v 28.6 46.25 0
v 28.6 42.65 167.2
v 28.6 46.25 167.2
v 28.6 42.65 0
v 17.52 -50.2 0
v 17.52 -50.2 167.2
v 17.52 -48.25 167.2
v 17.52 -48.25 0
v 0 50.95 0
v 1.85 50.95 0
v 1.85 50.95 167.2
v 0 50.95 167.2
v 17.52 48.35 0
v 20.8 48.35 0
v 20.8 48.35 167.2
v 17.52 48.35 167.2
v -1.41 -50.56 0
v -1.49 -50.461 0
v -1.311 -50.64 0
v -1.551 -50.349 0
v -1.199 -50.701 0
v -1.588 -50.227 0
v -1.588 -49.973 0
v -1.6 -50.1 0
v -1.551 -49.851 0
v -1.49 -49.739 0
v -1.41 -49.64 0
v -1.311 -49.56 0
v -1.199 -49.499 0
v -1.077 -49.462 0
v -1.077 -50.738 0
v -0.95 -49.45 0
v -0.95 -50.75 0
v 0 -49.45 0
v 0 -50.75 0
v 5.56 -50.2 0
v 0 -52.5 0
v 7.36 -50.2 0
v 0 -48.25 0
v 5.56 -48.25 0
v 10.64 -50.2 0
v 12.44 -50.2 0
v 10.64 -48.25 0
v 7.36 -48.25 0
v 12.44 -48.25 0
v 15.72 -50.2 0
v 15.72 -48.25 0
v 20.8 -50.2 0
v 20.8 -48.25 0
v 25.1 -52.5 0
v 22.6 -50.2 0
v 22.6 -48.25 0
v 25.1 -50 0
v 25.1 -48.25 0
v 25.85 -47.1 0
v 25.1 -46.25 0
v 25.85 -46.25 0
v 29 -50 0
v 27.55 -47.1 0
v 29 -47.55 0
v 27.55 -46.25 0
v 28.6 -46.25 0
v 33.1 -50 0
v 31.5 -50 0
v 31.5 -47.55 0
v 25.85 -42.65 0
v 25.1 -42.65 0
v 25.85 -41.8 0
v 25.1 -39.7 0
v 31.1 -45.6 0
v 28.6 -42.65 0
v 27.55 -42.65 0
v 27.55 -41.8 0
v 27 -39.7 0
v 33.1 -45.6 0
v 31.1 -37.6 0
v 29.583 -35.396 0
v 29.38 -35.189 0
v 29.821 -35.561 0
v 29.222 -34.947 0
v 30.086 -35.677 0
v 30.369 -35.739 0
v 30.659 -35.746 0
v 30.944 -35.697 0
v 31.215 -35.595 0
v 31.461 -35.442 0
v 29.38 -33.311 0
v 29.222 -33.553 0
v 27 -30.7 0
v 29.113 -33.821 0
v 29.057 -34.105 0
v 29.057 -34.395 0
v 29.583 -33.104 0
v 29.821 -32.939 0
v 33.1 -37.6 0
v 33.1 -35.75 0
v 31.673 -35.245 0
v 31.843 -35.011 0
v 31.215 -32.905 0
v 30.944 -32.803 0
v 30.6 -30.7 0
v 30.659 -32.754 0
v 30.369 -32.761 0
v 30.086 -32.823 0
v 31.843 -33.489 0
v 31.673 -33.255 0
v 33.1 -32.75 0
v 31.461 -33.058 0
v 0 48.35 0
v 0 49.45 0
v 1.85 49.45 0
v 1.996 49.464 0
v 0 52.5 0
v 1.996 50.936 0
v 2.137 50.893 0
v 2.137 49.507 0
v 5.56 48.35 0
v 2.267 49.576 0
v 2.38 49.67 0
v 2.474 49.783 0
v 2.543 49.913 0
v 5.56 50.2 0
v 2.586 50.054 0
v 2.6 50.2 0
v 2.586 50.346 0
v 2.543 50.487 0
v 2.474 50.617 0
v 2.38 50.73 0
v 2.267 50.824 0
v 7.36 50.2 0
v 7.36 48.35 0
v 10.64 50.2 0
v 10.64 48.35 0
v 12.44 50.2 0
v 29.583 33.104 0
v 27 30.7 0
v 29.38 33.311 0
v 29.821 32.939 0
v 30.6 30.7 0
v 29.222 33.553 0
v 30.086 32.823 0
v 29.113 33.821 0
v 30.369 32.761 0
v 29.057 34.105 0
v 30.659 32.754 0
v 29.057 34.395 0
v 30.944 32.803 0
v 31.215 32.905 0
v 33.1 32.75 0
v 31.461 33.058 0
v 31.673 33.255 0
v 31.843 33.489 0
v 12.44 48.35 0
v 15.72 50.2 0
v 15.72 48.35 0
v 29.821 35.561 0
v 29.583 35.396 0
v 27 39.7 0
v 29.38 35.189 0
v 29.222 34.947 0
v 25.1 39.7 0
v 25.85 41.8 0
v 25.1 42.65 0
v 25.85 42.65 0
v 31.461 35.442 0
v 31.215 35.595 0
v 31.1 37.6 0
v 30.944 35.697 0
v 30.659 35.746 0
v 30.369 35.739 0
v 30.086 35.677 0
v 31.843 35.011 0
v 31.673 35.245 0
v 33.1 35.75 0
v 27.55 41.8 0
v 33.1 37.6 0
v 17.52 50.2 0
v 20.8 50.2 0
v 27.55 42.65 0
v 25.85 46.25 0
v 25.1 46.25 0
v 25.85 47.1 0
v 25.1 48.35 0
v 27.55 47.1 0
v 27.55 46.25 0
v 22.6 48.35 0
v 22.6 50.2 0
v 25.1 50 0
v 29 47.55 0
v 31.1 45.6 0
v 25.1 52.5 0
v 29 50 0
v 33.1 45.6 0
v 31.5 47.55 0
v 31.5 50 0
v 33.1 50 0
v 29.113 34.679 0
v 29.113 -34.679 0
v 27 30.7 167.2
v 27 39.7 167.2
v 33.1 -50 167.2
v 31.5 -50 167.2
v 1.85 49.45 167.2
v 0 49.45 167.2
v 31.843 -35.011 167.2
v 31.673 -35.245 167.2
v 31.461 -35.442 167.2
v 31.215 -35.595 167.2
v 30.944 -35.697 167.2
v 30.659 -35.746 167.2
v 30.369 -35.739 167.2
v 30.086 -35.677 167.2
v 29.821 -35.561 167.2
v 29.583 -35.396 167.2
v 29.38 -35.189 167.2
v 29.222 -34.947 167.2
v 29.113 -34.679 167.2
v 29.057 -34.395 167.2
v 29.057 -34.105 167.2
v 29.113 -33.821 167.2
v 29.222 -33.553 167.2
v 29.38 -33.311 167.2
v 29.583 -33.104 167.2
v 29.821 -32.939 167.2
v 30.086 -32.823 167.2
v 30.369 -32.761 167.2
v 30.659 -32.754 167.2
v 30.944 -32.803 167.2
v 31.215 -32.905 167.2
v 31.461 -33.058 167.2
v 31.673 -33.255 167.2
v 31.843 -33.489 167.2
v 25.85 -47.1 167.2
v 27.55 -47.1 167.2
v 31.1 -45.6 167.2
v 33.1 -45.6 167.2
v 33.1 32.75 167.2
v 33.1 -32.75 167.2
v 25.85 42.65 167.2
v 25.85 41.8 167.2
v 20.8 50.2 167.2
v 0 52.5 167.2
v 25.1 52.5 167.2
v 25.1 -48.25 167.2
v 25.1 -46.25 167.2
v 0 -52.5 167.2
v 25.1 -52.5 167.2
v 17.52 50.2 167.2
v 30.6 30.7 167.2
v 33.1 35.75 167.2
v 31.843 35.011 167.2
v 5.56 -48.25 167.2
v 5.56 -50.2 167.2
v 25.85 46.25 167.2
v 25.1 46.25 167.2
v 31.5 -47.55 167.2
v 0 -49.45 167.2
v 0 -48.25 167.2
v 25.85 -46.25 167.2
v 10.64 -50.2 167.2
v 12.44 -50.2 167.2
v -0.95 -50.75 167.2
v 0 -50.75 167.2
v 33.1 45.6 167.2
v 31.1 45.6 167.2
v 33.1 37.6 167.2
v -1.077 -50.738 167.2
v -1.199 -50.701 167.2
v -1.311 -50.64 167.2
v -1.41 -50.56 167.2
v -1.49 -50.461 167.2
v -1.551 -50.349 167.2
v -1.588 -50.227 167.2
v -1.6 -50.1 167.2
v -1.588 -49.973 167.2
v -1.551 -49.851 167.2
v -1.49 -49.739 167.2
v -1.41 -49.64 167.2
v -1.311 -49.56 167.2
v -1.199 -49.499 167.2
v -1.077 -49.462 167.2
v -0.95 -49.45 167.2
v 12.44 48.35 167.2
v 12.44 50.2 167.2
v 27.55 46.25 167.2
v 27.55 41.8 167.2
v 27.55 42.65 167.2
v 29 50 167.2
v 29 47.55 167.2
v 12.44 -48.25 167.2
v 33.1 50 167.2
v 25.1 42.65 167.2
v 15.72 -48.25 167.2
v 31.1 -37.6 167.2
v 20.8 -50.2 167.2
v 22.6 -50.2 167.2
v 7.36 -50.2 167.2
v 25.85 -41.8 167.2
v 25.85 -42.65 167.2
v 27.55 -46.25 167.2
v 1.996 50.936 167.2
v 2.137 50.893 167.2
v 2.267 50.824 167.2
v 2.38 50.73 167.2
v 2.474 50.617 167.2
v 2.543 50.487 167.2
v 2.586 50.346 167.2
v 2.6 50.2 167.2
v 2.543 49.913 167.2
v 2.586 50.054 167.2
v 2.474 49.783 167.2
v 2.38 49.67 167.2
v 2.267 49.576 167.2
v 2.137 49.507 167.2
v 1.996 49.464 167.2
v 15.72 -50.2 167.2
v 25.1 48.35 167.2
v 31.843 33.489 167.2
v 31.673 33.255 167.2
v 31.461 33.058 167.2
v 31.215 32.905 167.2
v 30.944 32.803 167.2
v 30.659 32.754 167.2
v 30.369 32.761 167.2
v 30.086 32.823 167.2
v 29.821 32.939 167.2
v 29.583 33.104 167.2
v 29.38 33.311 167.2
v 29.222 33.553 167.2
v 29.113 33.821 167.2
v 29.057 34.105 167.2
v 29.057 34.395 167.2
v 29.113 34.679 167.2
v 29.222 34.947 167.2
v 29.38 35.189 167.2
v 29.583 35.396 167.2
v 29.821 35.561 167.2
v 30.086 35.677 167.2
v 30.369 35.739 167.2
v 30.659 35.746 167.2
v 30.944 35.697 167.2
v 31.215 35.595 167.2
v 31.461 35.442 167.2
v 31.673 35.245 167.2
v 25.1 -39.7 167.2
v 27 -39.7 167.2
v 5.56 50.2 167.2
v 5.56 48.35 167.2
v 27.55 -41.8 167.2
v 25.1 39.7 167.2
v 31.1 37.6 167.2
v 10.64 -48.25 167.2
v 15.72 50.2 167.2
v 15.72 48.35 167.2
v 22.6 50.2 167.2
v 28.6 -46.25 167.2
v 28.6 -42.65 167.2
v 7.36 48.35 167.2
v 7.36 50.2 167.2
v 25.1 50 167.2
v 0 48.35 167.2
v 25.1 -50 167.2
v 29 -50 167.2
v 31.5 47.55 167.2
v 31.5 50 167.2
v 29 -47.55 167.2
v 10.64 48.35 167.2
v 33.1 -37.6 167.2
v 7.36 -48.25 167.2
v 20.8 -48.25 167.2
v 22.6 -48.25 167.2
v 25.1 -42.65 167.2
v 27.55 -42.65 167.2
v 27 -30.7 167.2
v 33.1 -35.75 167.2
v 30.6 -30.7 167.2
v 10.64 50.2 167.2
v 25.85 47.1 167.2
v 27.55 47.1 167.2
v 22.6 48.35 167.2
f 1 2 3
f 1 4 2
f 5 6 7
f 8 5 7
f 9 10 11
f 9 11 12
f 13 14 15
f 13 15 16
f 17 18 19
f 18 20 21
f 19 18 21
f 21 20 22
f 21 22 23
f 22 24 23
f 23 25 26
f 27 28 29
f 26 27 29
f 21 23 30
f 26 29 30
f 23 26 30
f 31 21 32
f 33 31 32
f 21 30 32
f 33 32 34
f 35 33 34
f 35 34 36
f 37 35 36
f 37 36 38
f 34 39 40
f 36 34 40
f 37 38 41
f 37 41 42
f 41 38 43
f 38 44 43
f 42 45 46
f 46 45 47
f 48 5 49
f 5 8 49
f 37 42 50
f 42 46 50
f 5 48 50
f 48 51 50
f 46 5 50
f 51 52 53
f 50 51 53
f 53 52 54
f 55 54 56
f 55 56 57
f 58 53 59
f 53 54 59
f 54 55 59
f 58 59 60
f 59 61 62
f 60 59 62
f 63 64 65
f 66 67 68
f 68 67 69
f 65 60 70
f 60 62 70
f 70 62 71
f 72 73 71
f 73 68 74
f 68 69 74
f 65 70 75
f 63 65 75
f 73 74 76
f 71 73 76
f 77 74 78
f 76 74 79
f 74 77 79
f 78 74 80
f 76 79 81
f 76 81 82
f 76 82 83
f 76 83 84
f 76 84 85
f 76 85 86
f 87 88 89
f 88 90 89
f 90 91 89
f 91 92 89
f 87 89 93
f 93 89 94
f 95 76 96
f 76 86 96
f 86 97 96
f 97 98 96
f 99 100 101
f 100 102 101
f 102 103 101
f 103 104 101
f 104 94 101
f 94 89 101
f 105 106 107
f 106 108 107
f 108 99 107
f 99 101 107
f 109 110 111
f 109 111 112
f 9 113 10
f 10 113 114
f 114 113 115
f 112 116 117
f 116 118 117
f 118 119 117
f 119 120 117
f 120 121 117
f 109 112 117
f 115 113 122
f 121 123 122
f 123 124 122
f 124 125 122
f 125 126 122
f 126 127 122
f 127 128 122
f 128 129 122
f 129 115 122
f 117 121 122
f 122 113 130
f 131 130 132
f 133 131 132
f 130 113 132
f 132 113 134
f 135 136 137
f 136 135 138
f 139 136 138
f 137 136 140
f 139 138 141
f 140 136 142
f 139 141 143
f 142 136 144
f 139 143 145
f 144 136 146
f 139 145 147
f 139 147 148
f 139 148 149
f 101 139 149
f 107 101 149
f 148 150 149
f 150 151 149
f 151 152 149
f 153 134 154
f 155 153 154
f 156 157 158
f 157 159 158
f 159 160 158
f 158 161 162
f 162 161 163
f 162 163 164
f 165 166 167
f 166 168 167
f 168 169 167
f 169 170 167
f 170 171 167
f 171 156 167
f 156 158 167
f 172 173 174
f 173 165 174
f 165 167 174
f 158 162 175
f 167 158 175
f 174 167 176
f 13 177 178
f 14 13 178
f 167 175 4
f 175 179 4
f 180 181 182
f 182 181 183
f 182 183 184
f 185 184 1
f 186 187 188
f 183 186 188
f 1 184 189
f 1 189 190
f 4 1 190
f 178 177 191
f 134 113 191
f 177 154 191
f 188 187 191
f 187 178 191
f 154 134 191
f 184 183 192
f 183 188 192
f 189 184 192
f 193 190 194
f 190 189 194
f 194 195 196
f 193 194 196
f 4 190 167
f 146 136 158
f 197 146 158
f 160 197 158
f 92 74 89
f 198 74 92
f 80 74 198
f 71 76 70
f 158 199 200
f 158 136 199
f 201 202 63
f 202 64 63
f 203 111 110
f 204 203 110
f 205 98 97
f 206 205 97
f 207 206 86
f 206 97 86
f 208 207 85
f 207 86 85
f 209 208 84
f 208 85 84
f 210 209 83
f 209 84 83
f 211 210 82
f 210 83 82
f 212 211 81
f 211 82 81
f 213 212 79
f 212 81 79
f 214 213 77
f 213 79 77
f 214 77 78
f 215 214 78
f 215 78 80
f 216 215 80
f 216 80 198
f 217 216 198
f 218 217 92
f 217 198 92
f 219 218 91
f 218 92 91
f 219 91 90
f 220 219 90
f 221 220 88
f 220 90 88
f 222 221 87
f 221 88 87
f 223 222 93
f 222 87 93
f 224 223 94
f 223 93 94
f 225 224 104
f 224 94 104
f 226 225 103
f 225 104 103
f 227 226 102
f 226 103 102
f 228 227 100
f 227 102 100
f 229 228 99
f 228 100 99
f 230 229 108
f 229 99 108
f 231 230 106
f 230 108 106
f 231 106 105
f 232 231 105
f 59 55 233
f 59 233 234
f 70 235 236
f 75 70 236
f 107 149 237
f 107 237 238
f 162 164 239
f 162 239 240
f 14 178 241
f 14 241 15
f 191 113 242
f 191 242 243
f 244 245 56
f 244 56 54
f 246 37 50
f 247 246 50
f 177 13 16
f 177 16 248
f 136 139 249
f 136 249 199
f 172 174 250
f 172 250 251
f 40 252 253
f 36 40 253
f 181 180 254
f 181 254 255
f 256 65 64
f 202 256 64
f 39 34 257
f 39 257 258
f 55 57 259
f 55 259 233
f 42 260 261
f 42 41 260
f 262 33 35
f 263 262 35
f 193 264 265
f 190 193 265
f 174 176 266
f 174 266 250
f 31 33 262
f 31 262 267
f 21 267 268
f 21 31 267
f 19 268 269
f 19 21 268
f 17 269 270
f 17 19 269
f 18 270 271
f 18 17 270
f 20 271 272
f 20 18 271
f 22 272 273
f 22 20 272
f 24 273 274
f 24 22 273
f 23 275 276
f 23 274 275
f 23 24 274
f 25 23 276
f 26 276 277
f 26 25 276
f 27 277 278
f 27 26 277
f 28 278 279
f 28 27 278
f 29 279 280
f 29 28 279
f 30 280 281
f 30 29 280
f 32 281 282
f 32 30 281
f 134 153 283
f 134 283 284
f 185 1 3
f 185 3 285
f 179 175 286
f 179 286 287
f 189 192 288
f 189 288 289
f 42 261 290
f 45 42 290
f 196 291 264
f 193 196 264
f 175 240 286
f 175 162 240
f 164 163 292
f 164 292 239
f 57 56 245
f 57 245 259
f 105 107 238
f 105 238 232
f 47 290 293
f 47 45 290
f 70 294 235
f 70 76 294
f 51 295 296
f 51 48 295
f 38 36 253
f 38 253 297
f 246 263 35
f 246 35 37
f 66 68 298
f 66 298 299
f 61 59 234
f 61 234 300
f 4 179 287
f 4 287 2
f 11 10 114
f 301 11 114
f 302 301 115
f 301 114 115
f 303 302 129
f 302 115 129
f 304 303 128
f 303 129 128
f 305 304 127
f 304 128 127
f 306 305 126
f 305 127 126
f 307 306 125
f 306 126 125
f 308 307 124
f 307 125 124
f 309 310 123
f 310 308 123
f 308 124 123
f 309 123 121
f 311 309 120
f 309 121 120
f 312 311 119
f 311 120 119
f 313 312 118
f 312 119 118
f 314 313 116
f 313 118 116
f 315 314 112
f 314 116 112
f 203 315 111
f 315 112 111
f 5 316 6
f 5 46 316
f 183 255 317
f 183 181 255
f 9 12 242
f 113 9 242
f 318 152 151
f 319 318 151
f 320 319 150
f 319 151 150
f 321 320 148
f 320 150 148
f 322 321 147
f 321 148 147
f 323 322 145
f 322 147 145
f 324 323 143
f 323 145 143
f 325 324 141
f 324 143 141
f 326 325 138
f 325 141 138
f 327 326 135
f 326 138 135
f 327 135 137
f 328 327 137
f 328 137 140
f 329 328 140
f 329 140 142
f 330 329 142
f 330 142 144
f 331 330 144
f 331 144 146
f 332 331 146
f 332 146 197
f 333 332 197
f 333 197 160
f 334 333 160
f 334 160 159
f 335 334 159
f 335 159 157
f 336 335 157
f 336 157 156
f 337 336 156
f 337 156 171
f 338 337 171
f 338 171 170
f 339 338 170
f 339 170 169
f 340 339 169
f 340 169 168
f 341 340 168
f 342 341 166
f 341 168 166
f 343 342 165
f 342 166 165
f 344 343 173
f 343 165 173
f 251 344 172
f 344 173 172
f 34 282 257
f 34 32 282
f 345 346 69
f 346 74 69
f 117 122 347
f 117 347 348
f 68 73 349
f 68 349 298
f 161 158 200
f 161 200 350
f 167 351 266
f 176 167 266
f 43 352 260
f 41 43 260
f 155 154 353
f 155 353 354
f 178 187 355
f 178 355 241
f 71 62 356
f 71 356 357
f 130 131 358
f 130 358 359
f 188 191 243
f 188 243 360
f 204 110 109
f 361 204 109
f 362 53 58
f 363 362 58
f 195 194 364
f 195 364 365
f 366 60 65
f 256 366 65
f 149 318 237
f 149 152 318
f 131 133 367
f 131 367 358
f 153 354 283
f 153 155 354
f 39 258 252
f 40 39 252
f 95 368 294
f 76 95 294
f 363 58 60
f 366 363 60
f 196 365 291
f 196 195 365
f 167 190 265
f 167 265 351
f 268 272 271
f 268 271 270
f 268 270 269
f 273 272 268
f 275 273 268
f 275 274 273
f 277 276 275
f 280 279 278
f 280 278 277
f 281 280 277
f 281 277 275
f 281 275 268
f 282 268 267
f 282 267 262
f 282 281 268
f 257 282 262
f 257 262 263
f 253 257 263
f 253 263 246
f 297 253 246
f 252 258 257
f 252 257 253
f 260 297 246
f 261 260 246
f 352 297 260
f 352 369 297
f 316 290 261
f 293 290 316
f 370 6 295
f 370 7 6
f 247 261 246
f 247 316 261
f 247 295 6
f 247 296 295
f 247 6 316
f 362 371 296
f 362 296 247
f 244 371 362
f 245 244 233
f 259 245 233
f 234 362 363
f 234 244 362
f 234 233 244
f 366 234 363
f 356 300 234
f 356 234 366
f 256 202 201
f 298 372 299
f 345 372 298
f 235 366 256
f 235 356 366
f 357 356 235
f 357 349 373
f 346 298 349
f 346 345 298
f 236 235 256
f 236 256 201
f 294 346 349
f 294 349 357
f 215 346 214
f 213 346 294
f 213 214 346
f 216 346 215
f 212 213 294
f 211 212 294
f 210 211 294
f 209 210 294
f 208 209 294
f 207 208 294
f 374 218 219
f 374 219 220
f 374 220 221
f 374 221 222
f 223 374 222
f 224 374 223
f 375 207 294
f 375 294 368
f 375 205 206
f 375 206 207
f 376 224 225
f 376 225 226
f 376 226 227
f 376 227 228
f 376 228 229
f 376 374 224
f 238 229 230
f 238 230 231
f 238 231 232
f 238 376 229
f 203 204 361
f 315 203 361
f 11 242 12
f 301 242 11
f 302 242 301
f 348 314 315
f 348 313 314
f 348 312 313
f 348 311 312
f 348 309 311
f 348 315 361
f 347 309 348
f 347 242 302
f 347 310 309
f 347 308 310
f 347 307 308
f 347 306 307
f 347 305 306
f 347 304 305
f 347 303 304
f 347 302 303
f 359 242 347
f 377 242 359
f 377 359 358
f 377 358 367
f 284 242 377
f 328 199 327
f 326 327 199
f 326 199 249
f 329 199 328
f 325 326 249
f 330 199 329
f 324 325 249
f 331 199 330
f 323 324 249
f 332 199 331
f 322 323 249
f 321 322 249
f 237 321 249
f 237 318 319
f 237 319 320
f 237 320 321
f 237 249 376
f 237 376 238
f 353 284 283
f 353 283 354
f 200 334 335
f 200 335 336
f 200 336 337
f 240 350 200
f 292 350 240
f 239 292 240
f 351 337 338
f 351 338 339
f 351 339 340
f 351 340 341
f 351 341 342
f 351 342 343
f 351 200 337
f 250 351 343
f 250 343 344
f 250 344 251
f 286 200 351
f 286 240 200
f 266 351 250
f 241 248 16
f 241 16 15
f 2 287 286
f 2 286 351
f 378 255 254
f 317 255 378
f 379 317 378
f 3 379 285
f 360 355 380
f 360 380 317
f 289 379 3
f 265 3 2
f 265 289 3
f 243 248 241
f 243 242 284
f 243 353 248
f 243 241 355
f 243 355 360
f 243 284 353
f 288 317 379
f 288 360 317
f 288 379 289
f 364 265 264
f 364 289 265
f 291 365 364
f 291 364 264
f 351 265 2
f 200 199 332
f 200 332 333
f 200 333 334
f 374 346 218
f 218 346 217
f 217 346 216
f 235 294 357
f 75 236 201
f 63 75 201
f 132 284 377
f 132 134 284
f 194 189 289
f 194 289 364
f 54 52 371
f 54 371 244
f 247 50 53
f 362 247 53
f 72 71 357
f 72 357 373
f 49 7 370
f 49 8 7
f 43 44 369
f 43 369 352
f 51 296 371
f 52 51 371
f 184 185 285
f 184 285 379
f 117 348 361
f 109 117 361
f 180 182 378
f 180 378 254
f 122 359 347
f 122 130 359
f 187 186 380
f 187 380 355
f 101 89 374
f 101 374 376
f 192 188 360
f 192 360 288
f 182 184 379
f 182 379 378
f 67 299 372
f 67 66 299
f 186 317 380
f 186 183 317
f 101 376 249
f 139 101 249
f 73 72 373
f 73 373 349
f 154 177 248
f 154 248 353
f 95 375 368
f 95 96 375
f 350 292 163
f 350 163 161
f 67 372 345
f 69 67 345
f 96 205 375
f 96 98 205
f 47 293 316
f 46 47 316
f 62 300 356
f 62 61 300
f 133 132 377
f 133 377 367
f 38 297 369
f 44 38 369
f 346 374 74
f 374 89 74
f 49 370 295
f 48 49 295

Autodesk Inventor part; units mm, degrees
ref_plane "YZ Plane" through (0, 0, 0) normal (1, 0, 0) x (0, 1, 0)
ref_plane "XZ Plane" through (0, 0, 0) normal (0, 1, 0) x (-1, 0, 0)
ref_plane "XY Plane" through (0, 0, 0) normal (0, 0, 1) x (1, 0, 0)
sketch "Sketch1" plane through (0, 0, 0) normal (0, 0, 1) x (1, 0, 0)
  line L0 (0, 52.5) -> (25.1, 52.5)
  line L1 (33.1, 32.75) -> (33.1, -32.75)
  line L2 (0, -48.25) -> (5.56, -48.25)
  line L3 (27, -30.7) -> (30.6, -30.7)
  line L4 (30.6, -30.7) -> (30.6, 30.7)
  line L5 (30.6, 30.7) -> (27, 30.7)
  line L6 (25.1, 48.35) -> (22.6, 48.35)
  arc A0 (-0.95, -49.45) -> (-0.95, -50.75) centre (-0.95, -50.1) ccw
  line L7 (-0.95, -49.45) -> (0, -49.45)
  line L8 (0, -49.45) -> (0, -48.25)
  line L9 (-0.95, -50.75) -> (0, -50.75)
  line L10 (0, -50.75) -> (0, -52.5)
  line L11 (0, -52.5) -> (25.1, -52.5)
  line L12 (25.1, -52.5) -> (25.1, -50)
  line L13 (25.1, -50) -> (29, -50)
  line L14 (29, -50) -> (29, -47.55)
  line L15 (29, -47.55) -> (31.5, -47.55)
  line L16 (31.5, -47.55) -> (31.5, -50)
  line L17 (31.5, -50) -> (33.1, -50)
  line L18 (25.1, 52.5) -> (25.1, 50)
  line L19 (25.1, 50) -> (29, 50)
  line L20 (29, 50) -> (29, 47.55)
  line L21 (29, 47.55) -> (31.5, 47.55)
  line L22 (31.5, 47.55) -> (31.5, 50)
  line L23 (31.5, 50) -> (33.1, 50)
  arc A1 (1.85, 49.45) -> (1.85, 50.95) centre (1.85, 50.2) ccw
  line L24 (0, 49.45) -> (0, 48.35)
  line L25 (0, 50.95) -> (0, 52.5)
  line L26 (1.85, 50.95) -> (0, 50.95)
  line L27 (1.85, 49.45) -> (0, 49.45)
  line L28 (27, 30.7) -> (27, 39.7)
  line L29 (27, 39.7) -> (25.1, 39.7)
  line L30 (25.1, 46.25) -> (25.1, 48.35)
  line L31 (27, -30.7) -> (27, -39.7)
  line L32 (27, -39.7) -> (25.1, -39.7)
  line L33 (25.1, -46.25) -> (25.1, -48.25)
  line L34 (-8.54, 0) -> (40.04, 0) projected
  line L35 (33.1, 50) -> (33.1, 45.6)
  line L36 (33.1, 45.6) -> (31.1, 45.6)
  line L37 (31.1, 45.6) -> (31.1, 37.6)
  line L38 (31.1, 37.6) -> (33.1, 37.6)
  line L39 (33.1, -37.6) -> (31.1, -37.6)
  line L40 (31.1, -37.6) -> (31.1, -45.6)
  line L41 (31.1, -45.6) -> (33.1, -45.6)
  line L42 (33.1, -45.6) -> (33.1, -50)
  line L43 (33.1, 37.6) -> (33.1, 35.75)
  line L44 (33.1, 35.75) -> (30.55, 34.25)
  line L45 (30.55, 34.25) -> (33.1, 32.75)
  line L46 (33.1, -32.75) -> (30.55, -34.25)
  line L47 (30.55, -34.25) -> (33.1, -35.75)
  line L48 (33.1, -35.75) -> (33.1, -37.6)
  line L49 (22.6, 48.35) -> (22.6, 50.2)
  line L50 (22.6, 50.2) -> (20.8, 50.2)
  line L51 (20.8, 50.2) -> (20.8, 48.35)
  line L52 (20.8, 48.35) -> (17.52, 48.35)
  line L53 (17.52, 48.35) -> (17.52, 50.2)
  line L54 (17.52, 50.2) -> (15.72, 50.2)
  line L55 (15.72, 50.2) -> (15.72, 48.35)
  line L56 (15.72, 48.35) -> (12.44, 48.35)
  line L57 (12.44, 48.35) -> (12.44, 50.2)
  line L58 (12.44, 50.2) -> (10.64, 50.2)
  line L59 (10.64, 50.2) -> (10.64, 48.35)
  line L60 (10.64, 48.35) -> (7.36, 48.35)
  line L61 (7.36, 48.35) -> (7.36, 50.2)
  line L62 (7.36, 50.2) -> (5.56, 50.2)
  line L63 (5.56, 50.2) -> (5.56, 48.35)
  line L64 (5.56, 48.35) -> (0, 48.35)
  line L65 (5.56, -48.25) -> (5.56, -50.2)
  line L66 (5.56, -50.2) -> (7.36, -50.2)
  line L67 (7.36, -50.2) -> (7.36, -48.25)
  line L68 (7.36, -48.25) -> (10.64, -48.25)
  line L69 (10.64, -48.25) -> (10.64, -50.2)
  line L70 (10.64, -50.2) -> (12.44, -50.2)
  line L71 (12.44, -50.2) -> (12.44, -48.25)
  line L72 (12.44, -48.25) -> (15.72, -48.25)
  line L73 (15.72, -48.25) -> (15.72, -50.2)
  line L74 (15.72, -50.2) -> (17.52, -50.2)
  line L75 (17.52, -50.2) -> (17.52, -48.25)
  line L76 (17.52, -48.25) -> (20.8, -48.25)
  line L77 (20.8, -48.25) -> (20.8, -50.2)
  line L78 (20.8, -50.2) -> (22.6, -50.2)
  line L79 (22.6, -50.2) -> (22.6, -48.25)
  line L80 (22.6, -48.25) -> (25.1, -48.25)
  line L81 (25.1, 42.65) -> (25.1, 39.7)
  line L82 (25.1, 42.65) -> (25.85, 42.65)
  line L83 (25.85, 42.65) -> (25.85, 41.8)
  line L84 (25.85, 41.8) -> (27.55, 41.8)
  line L85 (27.55, 41.8) -> (27.55, 42.65)
  line L86 (27.55, 42.65) -> (28.6, 42.65)
  line L87 (28.6, 42.65) -> (28.6, 46.25)
  line L88 (28.6, 46.25) -> (27.55, 46.25)
  line L89 (27.55, 46.25) -> (27.55, 47.1)
  line L90 (27.55, 47.1) -> (25.85, 47.1)
  line L91 (25.85, 47.1) -> (25.85, 46.25)
  line L92 (25.85, 46.25) -> (25.1, 46.25)
  line L93 (25.1, -46.25) -> (25.85, -46.25)
  line L94 (25.85, -46.25) -> (25.85, -47.1)
  line L95 (25.85, -47.1) -> (27.55, -47.1)
  line L96 (27.55, -47.1) -> (27.55, -46.25)
  line L97 (27.55, -46.25) -> (28.6, -46.25)
  line L98 (28.6, -46.25) -> (28.6, -42.65)
  line L99 (28.6, -42.65) -> (27.55, -42.65)
  line L100 (27.55, -42.65) -> (27.55, -41.8)
  line L101 (27.55, -41.8) -> (25.85, -41.8)
  line L102 (25.85, -41.8) -> (25.85, -42.65)
  line L103 (25.85, -42.65) -> (25.1, -42.65)
  line L104 (25.1, -42.65) -> (25.1, -39.7)
  point P0 (0, 0)
  dimension "d7" = 21.8
  dimension "d10" = 0.65
  dimension "d11" = 34.7
  dimension "d14" = 105
  dimension "d16" = 100
  dimension "d17" = 95.1
  dimension "d18" = 2.5
  dimension "d20" = 1.6
  dimension "d24" = 2.5
  dimension "d29" = 96.6
  dimension "d30" = 1.85
  dimension "d31" = 1.5
  dimension "d32" = 100.3
  dimension "d33" = 8
  dimension "d34" = 33.1
  dimension "d35" = 2.6
  dimension "d36" = 12.8
  dimension "d37" = 6.1
  dimension "d49" = 8
  dimension "d50" = 4.4
  dimension "d51" = 4.1
  dimension "d52" = 3
  dimension "d53" = 2.55
  dimension "d55" = 68.5
  dimension "d56" = 1.8
  dimension "d57" = 5.08
  dimension "d58" = 10.5
  dimension "d59" = 4.15
  dimension "d60" = 3.6
  dimension "d61" = 0.75
  dimension "d62" = 1.7
  dimension "d63" = 3.5
  dimension "d64" = 5.3
  dimension "d65" = 94.2
extrude "Extrusion1" add sketch "Sketch1" along normal blind 167.2
sketch "Sketch2" plane through (0, 0, 167.2) normal (0, 0, 1) x (1, 0, 0)
  line L0 (33.1, -50) -> (33.1, 50) projected
  line L1 (-8.54, 0) -> (40.04, 0) projected
  point P0 (0, 0)
  point P1 (30.55, 34.25)
  point P2 (30.55, -34.25)
  dimension "d40" = 2.55
  dimension "d41" = 68.5
hole "Hole1" at (30.55, -34.25, 167.2) at (30.55, 34.25, 167.2) direction (0, 0, -1) diameter 3 end through all
properties part number "Fischer HB"
